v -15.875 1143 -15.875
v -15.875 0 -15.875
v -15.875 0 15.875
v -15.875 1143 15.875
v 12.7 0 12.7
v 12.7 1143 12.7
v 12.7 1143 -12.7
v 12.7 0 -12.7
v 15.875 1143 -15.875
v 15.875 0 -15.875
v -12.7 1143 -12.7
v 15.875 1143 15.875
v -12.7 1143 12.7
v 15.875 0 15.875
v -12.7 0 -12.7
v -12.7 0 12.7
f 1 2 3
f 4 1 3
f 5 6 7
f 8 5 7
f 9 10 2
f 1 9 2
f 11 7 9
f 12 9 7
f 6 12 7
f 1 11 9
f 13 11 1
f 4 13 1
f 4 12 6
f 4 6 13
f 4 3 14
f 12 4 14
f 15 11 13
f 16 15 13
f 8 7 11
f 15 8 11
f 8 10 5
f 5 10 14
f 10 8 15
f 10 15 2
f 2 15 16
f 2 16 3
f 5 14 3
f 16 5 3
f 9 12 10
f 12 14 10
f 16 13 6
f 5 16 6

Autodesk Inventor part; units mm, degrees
ref_plane "YZ Plane" through (0, 0, 0) normal (1, 0, 0) x (0, 1, 0)
ref_plane "XZ Plane" through (0, 0, 0) normal (0, 1, 0) x (-1, 0, 0)
ref_plane "XY Plane" through (0, 0, 0) normal (0, 0, 1) x (1, 0, 0)
sketch "Sketch1" plane through (0, 0, 0) normal (0, 1, 0) x (-1, 0, 0)
  line L0 (15.875, 15.875) -> (-15.875, 15.875)
  line L1 (-15.875, 15.875) -> (-15.875, -15.875)
  line L2 (-15.875, -15.875) -> (15.875, -15.875)
  line L3 (15.875, -15.875) -> (15.875, 15.875)
  line L4 (15.875, 15.875) -> (-15.875, -15.875) construction
  line L5 (-15.875, 15.875) -> (15.875, -15.875) construction
  line L6 (12.7, 12.7) -> (-12.7, 12.7)
  line L7 (-12.7, 12.7) -> (-12.7, -12.7)
  line L8 (-12.7, -12.7) -> (12.7, -12.7)
  line L9 (12.7, -12.7) -> (12.7, 12.7)
  line L10 (12.7, 12.7) -> (-12.7, -12.7) construction
  line L11 (-12.7, 12.7) -> (12.7, -12.7) construction
  point P0 (0, 0)
  dimension "d0" = 31.75
  dimension "d1" = 3.175
extrude "Extrusion1" add sketch "Sketch1" along normal blind 1143
equation "\"d0\" = tubeSize"
equation "\"d1\" = tubeThickness"
equation "\"d2\" = tubeLength"
equation "\"tubeSize\" = 31.75"
equation "\"tubeThickness\" = 3.175"
equation "\"tubeLength\" = 1143"
properties part number "1_250_inchSquareTube" material "Aluminum 6061"
